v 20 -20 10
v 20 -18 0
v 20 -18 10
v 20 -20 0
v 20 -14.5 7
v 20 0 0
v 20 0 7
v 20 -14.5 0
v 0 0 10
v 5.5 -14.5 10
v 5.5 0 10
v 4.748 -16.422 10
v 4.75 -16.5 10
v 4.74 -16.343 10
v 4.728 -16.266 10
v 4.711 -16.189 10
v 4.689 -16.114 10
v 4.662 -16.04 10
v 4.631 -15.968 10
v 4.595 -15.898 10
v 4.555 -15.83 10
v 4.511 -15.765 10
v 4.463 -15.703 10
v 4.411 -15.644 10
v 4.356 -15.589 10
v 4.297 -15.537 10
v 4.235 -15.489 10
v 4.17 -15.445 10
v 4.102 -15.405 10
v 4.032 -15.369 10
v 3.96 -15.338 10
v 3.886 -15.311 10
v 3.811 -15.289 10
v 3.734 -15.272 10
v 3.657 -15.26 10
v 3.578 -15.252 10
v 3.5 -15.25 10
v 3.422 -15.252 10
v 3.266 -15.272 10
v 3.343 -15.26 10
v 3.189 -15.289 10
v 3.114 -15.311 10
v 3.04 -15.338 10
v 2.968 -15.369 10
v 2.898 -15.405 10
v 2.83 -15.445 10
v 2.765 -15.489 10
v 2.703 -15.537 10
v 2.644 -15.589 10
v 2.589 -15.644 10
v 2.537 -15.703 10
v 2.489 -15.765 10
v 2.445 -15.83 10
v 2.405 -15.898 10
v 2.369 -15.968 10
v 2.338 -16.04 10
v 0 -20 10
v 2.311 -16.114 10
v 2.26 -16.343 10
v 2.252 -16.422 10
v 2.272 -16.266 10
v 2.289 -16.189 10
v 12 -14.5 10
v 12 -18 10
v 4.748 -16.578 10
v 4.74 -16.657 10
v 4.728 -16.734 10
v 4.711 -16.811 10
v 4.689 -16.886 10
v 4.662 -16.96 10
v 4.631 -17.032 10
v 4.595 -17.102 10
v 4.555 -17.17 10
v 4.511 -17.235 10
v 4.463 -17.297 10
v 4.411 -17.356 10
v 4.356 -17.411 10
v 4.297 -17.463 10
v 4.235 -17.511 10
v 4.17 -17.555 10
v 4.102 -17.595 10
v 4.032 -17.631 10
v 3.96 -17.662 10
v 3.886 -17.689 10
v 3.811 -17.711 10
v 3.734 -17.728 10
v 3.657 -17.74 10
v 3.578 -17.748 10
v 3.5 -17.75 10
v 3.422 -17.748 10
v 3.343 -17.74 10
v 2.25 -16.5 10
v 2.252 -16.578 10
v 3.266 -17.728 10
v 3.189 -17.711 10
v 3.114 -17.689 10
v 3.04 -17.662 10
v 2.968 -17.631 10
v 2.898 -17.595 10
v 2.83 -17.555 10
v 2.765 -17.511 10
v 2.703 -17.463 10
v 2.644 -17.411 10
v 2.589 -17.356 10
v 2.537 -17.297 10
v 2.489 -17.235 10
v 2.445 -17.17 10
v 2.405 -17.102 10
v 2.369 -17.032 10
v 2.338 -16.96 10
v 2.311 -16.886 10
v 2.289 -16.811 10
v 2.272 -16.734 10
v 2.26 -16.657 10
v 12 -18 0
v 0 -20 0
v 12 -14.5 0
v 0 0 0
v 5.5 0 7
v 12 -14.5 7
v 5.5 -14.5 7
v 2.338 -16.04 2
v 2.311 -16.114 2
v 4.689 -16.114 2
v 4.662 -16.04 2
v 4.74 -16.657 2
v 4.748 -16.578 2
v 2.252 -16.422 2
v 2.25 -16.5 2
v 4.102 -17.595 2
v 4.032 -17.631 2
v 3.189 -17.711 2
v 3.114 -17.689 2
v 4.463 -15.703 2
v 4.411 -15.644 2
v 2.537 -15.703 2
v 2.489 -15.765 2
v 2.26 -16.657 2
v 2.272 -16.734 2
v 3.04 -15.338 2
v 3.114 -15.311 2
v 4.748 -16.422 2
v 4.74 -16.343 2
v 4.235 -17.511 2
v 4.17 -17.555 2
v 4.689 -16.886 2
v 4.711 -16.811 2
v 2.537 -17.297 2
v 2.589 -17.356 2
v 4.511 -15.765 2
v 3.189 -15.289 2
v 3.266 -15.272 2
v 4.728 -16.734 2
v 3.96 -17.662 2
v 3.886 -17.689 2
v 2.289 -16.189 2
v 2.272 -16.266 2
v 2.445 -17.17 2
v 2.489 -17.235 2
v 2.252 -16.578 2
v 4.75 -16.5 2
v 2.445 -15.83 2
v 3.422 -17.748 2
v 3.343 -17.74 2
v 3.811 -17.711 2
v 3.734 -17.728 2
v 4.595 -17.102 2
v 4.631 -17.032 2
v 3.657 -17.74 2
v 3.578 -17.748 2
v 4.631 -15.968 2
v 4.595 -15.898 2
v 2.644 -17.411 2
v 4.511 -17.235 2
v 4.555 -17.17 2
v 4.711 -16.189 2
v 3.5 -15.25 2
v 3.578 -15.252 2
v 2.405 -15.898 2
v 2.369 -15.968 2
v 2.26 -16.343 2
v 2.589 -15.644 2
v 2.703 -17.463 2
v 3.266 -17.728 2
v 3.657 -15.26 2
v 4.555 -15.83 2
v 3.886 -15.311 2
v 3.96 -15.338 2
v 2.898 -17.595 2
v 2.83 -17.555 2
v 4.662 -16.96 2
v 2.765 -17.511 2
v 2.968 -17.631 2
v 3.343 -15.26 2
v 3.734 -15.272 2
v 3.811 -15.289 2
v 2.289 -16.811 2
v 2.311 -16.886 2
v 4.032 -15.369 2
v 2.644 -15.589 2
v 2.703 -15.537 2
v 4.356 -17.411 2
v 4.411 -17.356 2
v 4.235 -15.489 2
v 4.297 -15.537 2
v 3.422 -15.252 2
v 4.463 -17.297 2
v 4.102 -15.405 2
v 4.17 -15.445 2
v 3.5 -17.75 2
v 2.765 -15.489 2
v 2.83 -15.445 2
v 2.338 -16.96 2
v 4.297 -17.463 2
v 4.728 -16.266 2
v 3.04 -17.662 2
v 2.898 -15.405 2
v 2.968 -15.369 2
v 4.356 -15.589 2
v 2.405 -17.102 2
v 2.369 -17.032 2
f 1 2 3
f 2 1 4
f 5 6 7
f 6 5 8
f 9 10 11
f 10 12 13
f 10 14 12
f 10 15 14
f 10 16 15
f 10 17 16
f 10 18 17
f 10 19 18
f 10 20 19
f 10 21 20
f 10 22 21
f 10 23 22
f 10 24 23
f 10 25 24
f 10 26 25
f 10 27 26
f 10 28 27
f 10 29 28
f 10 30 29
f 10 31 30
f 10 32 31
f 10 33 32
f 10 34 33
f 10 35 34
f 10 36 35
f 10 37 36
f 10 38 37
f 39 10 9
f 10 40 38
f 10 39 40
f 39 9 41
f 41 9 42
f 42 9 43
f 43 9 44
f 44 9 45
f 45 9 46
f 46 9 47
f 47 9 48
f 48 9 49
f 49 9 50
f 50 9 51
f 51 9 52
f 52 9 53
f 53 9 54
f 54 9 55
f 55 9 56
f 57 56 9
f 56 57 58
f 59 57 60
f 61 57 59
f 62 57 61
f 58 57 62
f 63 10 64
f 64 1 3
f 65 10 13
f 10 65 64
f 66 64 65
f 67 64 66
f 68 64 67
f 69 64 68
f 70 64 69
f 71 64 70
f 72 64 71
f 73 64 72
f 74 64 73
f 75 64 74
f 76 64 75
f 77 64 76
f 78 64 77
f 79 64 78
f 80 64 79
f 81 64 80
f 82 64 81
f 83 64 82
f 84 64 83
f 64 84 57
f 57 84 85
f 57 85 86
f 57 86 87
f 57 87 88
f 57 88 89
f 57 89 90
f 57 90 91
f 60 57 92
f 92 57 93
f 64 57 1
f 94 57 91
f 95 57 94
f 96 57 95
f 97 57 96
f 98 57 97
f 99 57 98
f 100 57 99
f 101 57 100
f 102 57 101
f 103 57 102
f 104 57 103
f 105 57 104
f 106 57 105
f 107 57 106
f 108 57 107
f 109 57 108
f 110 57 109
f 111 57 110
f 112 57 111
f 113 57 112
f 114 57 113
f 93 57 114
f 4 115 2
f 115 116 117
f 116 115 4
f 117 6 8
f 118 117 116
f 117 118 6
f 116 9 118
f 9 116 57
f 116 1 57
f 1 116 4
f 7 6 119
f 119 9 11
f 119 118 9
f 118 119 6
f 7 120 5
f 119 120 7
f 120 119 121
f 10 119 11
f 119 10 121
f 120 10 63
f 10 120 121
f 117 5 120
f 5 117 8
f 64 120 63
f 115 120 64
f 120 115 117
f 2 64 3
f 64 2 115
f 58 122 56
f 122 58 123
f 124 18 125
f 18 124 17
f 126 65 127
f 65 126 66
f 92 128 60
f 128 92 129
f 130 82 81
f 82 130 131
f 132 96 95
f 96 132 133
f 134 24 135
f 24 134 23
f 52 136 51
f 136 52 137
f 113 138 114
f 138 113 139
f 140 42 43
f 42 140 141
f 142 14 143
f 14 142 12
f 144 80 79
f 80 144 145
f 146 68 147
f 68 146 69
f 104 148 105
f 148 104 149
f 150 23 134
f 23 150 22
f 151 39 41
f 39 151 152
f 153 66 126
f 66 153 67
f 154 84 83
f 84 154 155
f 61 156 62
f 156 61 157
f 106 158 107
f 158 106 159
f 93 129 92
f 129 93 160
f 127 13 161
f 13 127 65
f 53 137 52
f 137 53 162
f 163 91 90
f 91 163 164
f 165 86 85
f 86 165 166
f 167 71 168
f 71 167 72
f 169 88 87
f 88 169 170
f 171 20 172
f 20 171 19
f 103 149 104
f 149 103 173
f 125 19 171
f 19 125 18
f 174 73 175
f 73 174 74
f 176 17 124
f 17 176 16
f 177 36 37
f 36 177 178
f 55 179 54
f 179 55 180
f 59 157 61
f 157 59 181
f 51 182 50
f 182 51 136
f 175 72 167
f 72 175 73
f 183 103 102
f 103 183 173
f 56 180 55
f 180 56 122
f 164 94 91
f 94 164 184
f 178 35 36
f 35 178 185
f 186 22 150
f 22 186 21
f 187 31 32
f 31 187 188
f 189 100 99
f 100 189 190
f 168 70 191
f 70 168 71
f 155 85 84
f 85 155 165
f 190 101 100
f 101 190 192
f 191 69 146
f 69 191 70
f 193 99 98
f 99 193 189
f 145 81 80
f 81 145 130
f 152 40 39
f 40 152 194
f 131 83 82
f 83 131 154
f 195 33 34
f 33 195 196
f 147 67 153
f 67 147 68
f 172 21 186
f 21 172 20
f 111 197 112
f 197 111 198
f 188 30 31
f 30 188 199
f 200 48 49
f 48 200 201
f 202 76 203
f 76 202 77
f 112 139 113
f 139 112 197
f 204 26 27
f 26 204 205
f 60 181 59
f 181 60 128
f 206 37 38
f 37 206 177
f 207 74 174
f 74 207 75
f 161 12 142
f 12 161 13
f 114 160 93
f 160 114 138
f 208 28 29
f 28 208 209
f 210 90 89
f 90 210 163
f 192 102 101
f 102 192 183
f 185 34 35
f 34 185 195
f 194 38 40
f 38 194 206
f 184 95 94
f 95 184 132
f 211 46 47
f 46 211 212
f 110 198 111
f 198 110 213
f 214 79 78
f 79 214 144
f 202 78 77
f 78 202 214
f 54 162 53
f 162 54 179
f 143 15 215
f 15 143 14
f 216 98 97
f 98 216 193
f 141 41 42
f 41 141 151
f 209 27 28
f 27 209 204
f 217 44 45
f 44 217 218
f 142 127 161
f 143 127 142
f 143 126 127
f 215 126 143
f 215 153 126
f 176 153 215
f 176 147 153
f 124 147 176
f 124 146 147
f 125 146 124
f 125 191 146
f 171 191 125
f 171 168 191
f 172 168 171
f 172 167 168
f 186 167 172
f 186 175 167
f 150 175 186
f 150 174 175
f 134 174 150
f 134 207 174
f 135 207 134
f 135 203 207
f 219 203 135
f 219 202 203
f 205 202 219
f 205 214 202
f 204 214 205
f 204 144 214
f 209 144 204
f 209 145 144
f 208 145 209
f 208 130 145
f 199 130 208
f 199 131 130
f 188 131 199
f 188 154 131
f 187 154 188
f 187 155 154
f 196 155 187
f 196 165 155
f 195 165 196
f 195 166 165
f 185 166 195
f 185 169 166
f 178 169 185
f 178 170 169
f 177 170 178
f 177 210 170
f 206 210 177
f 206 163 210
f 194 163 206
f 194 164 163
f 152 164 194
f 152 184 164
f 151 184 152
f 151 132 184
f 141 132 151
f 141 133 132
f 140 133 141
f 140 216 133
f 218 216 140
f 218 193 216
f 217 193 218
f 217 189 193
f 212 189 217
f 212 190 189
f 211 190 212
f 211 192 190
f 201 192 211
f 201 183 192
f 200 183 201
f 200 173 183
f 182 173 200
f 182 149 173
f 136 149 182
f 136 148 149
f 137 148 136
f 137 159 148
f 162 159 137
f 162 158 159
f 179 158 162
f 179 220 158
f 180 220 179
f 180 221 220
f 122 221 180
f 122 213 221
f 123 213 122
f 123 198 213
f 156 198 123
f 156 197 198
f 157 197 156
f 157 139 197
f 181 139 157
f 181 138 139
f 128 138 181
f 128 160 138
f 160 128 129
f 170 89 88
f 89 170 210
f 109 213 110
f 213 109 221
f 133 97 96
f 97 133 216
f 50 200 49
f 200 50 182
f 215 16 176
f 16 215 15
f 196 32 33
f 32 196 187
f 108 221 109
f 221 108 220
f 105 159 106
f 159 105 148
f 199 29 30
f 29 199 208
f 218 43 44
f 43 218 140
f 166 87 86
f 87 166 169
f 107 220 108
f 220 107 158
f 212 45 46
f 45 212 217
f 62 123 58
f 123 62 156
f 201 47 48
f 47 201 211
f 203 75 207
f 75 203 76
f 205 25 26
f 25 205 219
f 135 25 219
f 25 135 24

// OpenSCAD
widthX = 20;

widthY = 20;

height = 10;

wallWidth = 3;

outerWidth = 5;

scale([1, -1, 1]) {
    difference() {
        cube([widthX, widthY, height]);

        translate([outerWidth + 0.5, -1, height - wallWidth ]) {
            cube([widthX + 1, widthY - outerWidth + 0.5, wallWidth + 2]);
        }

        translate([widthX - 8, widthY - outerWidth - 0.5, 0 ]) {
            cube([8, 3.5, 20]);
        }

        // Join holes
        translate([3.5 , widthY - 3.5, 2]) {
            cylinder(r=1.25, h=11, $fn=100);
        }
    }
}
